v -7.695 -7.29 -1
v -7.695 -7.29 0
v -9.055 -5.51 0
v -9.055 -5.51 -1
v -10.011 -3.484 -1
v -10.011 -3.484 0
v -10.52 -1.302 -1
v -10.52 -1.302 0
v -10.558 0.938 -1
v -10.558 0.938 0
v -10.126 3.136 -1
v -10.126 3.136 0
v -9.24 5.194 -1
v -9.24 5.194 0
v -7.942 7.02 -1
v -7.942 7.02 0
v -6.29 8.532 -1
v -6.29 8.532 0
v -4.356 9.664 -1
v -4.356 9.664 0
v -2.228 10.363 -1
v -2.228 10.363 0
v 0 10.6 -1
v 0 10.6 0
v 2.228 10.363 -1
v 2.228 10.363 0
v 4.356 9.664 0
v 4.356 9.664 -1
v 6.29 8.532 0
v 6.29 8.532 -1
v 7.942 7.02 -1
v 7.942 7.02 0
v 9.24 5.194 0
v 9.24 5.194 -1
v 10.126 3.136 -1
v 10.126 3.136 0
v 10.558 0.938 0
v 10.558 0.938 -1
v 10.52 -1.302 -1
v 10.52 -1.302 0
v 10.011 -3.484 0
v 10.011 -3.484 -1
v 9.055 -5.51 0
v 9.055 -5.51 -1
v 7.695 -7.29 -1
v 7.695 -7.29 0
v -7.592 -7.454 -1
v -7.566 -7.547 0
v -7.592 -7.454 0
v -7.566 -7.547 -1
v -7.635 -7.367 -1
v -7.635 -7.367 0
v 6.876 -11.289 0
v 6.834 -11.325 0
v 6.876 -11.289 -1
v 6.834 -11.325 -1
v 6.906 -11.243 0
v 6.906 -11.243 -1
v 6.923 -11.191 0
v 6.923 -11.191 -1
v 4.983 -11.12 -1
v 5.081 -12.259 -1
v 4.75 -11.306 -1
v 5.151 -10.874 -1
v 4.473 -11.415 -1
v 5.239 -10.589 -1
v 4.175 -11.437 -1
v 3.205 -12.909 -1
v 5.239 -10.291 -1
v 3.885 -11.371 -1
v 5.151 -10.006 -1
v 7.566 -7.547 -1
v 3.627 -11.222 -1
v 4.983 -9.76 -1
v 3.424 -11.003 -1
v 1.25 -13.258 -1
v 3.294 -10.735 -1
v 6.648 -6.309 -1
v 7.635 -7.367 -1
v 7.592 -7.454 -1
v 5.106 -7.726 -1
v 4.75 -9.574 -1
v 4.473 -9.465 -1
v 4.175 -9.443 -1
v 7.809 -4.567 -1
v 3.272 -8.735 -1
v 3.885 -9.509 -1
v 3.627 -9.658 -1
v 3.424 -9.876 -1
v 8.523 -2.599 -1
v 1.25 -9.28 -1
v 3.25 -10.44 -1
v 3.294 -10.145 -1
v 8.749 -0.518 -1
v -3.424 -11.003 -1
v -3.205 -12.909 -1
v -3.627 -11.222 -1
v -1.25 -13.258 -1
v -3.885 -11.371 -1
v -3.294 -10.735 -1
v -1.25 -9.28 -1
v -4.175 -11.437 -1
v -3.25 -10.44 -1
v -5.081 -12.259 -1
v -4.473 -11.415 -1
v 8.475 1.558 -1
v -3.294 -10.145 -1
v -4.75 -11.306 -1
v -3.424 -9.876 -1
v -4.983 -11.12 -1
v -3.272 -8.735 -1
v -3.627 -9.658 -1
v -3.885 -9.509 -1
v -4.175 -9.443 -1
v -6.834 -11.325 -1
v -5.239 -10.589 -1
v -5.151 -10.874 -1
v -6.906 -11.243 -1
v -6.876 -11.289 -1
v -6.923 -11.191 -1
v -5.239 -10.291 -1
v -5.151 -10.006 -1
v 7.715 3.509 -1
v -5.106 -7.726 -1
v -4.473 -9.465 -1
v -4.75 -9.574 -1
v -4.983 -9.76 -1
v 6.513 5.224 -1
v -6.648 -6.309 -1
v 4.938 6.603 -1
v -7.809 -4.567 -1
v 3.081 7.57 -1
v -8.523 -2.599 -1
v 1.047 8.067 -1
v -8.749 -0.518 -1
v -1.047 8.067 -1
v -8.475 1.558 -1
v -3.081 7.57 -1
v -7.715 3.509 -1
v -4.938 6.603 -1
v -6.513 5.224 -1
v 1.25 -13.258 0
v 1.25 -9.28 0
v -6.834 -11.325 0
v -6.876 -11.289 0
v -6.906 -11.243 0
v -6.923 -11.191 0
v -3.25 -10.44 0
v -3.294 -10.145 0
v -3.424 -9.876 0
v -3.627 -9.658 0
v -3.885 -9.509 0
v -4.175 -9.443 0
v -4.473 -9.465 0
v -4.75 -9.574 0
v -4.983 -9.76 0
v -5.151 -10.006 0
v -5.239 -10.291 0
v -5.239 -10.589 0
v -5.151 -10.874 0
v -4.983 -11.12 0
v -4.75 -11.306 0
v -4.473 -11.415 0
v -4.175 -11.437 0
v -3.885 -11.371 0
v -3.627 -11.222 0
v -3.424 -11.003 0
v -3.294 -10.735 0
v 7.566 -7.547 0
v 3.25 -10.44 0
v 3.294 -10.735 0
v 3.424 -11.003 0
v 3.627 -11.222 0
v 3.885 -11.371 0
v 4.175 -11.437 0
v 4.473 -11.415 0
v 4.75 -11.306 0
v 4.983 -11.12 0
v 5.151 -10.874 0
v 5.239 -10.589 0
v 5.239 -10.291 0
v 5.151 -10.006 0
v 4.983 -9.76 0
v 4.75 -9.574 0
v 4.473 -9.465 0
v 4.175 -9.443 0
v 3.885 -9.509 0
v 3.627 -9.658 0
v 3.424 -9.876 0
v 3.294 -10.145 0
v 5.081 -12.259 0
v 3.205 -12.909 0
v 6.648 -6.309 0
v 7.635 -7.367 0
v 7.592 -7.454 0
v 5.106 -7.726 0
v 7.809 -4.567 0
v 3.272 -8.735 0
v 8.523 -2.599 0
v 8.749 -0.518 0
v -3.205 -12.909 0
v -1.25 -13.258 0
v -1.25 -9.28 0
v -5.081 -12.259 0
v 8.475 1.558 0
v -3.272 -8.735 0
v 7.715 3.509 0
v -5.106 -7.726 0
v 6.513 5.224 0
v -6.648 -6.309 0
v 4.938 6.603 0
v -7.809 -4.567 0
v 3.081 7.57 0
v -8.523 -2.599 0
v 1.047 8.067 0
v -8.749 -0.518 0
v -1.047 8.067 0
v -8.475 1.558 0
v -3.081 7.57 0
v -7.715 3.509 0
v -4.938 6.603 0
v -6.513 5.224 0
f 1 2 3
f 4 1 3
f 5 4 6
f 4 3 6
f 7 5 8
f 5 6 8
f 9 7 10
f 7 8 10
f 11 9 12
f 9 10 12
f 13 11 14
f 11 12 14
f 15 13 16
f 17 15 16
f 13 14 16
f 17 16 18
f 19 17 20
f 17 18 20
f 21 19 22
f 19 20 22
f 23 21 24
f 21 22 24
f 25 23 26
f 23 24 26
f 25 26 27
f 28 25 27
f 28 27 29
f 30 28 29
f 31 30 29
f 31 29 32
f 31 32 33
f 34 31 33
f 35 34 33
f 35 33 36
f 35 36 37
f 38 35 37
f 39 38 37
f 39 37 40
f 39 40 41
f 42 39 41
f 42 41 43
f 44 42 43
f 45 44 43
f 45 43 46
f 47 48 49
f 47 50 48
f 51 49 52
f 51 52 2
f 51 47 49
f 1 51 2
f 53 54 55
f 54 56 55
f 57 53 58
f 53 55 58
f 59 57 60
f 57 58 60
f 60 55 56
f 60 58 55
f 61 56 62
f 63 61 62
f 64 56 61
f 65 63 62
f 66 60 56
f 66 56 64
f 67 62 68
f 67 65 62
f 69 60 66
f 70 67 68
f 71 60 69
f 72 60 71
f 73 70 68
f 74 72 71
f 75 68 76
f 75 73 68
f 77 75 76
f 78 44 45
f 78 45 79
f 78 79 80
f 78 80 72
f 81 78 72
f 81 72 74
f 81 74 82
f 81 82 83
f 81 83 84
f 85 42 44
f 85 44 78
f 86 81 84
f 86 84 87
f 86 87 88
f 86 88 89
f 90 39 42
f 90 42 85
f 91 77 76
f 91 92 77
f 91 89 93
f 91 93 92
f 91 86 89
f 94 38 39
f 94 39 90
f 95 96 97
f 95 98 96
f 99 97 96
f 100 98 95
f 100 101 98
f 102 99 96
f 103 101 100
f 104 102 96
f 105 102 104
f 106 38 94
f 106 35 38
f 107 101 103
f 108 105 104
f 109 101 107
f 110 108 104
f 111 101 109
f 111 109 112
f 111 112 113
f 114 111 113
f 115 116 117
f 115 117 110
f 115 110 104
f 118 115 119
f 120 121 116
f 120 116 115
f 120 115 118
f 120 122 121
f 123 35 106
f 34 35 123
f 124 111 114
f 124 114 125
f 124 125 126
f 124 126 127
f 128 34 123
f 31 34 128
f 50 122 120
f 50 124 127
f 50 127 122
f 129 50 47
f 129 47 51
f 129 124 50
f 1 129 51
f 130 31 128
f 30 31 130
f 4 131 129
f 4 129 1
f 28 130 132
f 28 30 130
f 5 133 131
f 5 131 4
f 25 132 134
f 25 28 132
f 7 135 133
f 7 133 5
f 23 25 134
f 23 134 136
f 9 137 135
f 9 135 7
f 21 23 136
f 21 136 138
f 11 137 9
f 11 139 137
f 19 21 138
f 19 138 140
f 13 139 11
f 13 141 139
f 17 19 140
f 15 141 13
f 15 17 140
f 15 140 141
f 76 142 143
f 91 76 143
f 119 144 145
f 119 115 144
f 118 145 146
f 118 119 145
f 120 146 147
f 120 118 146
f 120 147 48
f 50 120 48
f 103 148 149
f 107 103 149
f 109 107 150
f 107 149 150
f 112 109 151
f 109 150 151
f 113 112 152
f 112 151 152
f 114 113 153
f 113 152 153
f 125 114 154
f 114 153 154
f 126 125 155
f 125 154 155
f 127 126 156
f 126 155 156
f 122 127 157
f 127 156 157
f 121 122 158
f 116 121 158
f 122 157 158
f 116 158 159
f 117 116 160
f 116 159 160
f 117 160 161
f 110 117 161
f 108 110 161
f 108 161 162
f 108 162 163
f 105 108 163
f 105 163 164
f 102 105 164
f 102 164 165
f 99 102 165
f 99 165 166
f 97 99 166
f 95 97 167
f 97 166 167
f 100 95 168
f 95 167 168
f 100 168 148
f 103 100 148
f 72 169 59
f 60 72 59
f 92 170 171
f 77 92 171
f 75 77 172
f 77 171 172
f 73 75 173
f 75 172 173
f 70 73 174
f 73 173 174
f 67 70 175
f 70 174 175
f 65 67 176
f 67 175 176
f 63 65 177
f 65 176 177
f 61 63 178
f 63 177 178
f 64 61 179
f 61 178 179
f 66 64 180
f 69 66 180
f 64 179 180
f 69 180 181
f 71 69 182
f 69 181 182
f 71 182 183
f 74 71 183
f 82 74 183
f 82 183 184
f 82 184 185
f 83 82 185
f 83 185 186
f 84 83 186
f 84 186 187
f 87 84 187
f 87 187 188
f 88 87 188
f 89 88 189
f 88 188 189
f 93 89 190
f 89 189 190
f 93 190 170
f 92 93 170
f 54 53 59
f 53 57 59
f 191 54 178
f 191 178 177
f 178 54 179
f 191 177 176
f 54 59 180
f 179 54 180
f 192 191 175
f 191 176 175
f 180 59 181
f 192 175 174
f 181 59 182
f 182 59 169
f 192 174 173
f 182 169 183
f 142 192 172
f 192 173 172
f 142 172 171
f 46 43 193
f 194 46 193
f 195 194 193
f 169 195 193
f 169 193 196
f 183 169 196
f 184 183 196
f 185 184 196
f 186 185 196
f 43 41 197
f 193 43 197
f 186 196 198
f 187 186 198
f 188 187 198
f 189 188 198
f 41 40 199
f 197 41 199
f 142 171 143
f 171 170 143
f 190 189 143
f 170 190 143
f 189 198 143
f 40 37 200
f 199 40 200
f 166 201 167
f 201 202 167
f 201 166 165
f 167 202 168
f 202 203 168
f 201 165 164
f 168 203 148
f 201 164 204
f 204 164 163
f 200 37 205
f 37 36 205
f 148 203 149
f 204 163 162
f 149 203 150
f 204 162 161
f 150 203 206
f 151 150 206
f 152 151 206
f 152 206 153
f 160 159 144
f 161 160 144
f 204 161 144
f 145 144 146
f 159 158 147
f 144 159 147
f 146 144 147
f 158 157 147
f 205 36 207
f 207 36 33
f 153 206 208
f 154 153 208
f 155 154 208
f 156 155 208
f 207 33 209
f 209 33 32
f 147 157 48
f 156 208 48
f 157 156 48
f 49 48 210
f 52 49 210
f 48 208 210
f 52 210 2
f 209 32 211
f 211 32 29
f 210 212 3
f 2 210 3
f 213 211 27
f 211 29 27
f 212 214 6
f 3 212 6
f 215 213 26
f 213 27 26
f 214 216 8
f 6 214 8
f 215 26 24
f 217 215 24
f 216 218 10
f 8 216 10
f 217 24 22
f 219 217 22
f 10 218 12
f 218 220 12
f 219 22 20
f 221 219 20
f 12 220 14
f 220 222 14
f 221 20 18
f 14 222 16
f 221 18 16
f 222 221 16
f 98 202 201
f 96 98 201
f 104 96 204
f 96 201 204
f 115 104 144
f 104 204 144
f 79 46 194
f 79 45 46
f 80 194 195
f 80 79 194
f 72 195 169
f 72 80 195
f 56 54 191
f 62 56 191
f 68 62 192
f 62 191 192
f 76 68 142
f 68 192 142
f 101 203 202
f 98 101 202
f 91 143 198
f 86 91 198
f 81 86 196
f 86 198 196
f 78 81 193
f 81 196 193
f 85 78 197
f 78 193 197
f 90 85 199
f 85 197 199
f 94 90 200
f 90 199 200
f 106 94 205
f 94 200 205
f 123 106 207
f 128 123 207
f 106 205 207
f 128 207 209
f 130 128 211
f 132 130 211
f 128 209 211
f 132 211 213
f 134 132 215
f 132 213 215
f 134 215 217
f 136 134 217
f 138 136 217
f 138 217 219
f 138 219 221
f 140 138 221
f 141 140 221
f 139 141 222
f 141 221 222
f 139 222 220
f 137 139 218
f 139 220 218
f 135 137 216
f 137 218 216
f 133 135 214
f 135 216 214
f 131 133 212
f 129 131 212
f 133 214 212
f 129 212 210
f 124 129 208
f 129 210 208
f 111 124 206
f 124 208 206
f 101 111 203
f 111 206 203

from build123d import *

# Parameters (mm, degrees)
SKETCH1_R  = 1
BODY_DEPTH = 1
FILLET1_R  = 0.2
FILLET2_R  = 0.5


with BuildPart() as part:
    # Sketch1 → Body (new body)
    with BuildSketch(Plane.XY):
        with BuildLine():
            Line((-1.25, -9.280254038), (-1.25, -13.258334542))
            ThreePointArc((-1.25, -13.258334542), (-4.197569907, -12.606259086), (-6.907964473, -11.276923892))
            Line((-6.907964473, -11.276923892), (-7.592035527, -7.397364163))
            ThreePointArc((-7.592035527, -7.397364163), (0, 10.6), (7.592035527, -7.397364163))
            Line((7.592035527, -7.397364163), (6.907964473, -11.276923892))
            ThreePointArc((6.907964473, -11.276923892), (4.197569907, -12.606259086), (1.25, -13.258334542))
            Line((1.25, -13.258334542), (1.25, -9.280254038))
            ThreePointArc((1.25, -9.280254038), (0, 8.13), (-1.25, -9.280254038))
        make_face()
        with Locations(Location((4.25, -10.439750506, 0), (0, 0, 180))):
            Circle(SKETCH1_R, mode=Mode.SUBTRACT)
        with Locations((-4.25, -10.439750506)):
            Circle(SKETCH1_R, mode=Mode.SUBTRACT)
    extrude(amount=-BODY_DEPTH)

    # Fillet1
    fillet1_edges = [part.edges().sort_by_distance(p)[0] for p in [
        (-6.907964473, -11.276923892, -0.5),
        (6.907964473, -11.276923892, -0.5),
    ]]
    fillet(fillet1_edges, radius=FILLET1_R)

    # Fillet2
    fillet2_edges = [part.edges().sort_by_distance(p)[0] for p in [
        (-7.592035527, -7.397364163, -0.5),
        (7.592035527, -7.397364163, -0.5),
    ]]
    fillet(fillet2_edges, radius=FILLET2_R)


solid = part.part
